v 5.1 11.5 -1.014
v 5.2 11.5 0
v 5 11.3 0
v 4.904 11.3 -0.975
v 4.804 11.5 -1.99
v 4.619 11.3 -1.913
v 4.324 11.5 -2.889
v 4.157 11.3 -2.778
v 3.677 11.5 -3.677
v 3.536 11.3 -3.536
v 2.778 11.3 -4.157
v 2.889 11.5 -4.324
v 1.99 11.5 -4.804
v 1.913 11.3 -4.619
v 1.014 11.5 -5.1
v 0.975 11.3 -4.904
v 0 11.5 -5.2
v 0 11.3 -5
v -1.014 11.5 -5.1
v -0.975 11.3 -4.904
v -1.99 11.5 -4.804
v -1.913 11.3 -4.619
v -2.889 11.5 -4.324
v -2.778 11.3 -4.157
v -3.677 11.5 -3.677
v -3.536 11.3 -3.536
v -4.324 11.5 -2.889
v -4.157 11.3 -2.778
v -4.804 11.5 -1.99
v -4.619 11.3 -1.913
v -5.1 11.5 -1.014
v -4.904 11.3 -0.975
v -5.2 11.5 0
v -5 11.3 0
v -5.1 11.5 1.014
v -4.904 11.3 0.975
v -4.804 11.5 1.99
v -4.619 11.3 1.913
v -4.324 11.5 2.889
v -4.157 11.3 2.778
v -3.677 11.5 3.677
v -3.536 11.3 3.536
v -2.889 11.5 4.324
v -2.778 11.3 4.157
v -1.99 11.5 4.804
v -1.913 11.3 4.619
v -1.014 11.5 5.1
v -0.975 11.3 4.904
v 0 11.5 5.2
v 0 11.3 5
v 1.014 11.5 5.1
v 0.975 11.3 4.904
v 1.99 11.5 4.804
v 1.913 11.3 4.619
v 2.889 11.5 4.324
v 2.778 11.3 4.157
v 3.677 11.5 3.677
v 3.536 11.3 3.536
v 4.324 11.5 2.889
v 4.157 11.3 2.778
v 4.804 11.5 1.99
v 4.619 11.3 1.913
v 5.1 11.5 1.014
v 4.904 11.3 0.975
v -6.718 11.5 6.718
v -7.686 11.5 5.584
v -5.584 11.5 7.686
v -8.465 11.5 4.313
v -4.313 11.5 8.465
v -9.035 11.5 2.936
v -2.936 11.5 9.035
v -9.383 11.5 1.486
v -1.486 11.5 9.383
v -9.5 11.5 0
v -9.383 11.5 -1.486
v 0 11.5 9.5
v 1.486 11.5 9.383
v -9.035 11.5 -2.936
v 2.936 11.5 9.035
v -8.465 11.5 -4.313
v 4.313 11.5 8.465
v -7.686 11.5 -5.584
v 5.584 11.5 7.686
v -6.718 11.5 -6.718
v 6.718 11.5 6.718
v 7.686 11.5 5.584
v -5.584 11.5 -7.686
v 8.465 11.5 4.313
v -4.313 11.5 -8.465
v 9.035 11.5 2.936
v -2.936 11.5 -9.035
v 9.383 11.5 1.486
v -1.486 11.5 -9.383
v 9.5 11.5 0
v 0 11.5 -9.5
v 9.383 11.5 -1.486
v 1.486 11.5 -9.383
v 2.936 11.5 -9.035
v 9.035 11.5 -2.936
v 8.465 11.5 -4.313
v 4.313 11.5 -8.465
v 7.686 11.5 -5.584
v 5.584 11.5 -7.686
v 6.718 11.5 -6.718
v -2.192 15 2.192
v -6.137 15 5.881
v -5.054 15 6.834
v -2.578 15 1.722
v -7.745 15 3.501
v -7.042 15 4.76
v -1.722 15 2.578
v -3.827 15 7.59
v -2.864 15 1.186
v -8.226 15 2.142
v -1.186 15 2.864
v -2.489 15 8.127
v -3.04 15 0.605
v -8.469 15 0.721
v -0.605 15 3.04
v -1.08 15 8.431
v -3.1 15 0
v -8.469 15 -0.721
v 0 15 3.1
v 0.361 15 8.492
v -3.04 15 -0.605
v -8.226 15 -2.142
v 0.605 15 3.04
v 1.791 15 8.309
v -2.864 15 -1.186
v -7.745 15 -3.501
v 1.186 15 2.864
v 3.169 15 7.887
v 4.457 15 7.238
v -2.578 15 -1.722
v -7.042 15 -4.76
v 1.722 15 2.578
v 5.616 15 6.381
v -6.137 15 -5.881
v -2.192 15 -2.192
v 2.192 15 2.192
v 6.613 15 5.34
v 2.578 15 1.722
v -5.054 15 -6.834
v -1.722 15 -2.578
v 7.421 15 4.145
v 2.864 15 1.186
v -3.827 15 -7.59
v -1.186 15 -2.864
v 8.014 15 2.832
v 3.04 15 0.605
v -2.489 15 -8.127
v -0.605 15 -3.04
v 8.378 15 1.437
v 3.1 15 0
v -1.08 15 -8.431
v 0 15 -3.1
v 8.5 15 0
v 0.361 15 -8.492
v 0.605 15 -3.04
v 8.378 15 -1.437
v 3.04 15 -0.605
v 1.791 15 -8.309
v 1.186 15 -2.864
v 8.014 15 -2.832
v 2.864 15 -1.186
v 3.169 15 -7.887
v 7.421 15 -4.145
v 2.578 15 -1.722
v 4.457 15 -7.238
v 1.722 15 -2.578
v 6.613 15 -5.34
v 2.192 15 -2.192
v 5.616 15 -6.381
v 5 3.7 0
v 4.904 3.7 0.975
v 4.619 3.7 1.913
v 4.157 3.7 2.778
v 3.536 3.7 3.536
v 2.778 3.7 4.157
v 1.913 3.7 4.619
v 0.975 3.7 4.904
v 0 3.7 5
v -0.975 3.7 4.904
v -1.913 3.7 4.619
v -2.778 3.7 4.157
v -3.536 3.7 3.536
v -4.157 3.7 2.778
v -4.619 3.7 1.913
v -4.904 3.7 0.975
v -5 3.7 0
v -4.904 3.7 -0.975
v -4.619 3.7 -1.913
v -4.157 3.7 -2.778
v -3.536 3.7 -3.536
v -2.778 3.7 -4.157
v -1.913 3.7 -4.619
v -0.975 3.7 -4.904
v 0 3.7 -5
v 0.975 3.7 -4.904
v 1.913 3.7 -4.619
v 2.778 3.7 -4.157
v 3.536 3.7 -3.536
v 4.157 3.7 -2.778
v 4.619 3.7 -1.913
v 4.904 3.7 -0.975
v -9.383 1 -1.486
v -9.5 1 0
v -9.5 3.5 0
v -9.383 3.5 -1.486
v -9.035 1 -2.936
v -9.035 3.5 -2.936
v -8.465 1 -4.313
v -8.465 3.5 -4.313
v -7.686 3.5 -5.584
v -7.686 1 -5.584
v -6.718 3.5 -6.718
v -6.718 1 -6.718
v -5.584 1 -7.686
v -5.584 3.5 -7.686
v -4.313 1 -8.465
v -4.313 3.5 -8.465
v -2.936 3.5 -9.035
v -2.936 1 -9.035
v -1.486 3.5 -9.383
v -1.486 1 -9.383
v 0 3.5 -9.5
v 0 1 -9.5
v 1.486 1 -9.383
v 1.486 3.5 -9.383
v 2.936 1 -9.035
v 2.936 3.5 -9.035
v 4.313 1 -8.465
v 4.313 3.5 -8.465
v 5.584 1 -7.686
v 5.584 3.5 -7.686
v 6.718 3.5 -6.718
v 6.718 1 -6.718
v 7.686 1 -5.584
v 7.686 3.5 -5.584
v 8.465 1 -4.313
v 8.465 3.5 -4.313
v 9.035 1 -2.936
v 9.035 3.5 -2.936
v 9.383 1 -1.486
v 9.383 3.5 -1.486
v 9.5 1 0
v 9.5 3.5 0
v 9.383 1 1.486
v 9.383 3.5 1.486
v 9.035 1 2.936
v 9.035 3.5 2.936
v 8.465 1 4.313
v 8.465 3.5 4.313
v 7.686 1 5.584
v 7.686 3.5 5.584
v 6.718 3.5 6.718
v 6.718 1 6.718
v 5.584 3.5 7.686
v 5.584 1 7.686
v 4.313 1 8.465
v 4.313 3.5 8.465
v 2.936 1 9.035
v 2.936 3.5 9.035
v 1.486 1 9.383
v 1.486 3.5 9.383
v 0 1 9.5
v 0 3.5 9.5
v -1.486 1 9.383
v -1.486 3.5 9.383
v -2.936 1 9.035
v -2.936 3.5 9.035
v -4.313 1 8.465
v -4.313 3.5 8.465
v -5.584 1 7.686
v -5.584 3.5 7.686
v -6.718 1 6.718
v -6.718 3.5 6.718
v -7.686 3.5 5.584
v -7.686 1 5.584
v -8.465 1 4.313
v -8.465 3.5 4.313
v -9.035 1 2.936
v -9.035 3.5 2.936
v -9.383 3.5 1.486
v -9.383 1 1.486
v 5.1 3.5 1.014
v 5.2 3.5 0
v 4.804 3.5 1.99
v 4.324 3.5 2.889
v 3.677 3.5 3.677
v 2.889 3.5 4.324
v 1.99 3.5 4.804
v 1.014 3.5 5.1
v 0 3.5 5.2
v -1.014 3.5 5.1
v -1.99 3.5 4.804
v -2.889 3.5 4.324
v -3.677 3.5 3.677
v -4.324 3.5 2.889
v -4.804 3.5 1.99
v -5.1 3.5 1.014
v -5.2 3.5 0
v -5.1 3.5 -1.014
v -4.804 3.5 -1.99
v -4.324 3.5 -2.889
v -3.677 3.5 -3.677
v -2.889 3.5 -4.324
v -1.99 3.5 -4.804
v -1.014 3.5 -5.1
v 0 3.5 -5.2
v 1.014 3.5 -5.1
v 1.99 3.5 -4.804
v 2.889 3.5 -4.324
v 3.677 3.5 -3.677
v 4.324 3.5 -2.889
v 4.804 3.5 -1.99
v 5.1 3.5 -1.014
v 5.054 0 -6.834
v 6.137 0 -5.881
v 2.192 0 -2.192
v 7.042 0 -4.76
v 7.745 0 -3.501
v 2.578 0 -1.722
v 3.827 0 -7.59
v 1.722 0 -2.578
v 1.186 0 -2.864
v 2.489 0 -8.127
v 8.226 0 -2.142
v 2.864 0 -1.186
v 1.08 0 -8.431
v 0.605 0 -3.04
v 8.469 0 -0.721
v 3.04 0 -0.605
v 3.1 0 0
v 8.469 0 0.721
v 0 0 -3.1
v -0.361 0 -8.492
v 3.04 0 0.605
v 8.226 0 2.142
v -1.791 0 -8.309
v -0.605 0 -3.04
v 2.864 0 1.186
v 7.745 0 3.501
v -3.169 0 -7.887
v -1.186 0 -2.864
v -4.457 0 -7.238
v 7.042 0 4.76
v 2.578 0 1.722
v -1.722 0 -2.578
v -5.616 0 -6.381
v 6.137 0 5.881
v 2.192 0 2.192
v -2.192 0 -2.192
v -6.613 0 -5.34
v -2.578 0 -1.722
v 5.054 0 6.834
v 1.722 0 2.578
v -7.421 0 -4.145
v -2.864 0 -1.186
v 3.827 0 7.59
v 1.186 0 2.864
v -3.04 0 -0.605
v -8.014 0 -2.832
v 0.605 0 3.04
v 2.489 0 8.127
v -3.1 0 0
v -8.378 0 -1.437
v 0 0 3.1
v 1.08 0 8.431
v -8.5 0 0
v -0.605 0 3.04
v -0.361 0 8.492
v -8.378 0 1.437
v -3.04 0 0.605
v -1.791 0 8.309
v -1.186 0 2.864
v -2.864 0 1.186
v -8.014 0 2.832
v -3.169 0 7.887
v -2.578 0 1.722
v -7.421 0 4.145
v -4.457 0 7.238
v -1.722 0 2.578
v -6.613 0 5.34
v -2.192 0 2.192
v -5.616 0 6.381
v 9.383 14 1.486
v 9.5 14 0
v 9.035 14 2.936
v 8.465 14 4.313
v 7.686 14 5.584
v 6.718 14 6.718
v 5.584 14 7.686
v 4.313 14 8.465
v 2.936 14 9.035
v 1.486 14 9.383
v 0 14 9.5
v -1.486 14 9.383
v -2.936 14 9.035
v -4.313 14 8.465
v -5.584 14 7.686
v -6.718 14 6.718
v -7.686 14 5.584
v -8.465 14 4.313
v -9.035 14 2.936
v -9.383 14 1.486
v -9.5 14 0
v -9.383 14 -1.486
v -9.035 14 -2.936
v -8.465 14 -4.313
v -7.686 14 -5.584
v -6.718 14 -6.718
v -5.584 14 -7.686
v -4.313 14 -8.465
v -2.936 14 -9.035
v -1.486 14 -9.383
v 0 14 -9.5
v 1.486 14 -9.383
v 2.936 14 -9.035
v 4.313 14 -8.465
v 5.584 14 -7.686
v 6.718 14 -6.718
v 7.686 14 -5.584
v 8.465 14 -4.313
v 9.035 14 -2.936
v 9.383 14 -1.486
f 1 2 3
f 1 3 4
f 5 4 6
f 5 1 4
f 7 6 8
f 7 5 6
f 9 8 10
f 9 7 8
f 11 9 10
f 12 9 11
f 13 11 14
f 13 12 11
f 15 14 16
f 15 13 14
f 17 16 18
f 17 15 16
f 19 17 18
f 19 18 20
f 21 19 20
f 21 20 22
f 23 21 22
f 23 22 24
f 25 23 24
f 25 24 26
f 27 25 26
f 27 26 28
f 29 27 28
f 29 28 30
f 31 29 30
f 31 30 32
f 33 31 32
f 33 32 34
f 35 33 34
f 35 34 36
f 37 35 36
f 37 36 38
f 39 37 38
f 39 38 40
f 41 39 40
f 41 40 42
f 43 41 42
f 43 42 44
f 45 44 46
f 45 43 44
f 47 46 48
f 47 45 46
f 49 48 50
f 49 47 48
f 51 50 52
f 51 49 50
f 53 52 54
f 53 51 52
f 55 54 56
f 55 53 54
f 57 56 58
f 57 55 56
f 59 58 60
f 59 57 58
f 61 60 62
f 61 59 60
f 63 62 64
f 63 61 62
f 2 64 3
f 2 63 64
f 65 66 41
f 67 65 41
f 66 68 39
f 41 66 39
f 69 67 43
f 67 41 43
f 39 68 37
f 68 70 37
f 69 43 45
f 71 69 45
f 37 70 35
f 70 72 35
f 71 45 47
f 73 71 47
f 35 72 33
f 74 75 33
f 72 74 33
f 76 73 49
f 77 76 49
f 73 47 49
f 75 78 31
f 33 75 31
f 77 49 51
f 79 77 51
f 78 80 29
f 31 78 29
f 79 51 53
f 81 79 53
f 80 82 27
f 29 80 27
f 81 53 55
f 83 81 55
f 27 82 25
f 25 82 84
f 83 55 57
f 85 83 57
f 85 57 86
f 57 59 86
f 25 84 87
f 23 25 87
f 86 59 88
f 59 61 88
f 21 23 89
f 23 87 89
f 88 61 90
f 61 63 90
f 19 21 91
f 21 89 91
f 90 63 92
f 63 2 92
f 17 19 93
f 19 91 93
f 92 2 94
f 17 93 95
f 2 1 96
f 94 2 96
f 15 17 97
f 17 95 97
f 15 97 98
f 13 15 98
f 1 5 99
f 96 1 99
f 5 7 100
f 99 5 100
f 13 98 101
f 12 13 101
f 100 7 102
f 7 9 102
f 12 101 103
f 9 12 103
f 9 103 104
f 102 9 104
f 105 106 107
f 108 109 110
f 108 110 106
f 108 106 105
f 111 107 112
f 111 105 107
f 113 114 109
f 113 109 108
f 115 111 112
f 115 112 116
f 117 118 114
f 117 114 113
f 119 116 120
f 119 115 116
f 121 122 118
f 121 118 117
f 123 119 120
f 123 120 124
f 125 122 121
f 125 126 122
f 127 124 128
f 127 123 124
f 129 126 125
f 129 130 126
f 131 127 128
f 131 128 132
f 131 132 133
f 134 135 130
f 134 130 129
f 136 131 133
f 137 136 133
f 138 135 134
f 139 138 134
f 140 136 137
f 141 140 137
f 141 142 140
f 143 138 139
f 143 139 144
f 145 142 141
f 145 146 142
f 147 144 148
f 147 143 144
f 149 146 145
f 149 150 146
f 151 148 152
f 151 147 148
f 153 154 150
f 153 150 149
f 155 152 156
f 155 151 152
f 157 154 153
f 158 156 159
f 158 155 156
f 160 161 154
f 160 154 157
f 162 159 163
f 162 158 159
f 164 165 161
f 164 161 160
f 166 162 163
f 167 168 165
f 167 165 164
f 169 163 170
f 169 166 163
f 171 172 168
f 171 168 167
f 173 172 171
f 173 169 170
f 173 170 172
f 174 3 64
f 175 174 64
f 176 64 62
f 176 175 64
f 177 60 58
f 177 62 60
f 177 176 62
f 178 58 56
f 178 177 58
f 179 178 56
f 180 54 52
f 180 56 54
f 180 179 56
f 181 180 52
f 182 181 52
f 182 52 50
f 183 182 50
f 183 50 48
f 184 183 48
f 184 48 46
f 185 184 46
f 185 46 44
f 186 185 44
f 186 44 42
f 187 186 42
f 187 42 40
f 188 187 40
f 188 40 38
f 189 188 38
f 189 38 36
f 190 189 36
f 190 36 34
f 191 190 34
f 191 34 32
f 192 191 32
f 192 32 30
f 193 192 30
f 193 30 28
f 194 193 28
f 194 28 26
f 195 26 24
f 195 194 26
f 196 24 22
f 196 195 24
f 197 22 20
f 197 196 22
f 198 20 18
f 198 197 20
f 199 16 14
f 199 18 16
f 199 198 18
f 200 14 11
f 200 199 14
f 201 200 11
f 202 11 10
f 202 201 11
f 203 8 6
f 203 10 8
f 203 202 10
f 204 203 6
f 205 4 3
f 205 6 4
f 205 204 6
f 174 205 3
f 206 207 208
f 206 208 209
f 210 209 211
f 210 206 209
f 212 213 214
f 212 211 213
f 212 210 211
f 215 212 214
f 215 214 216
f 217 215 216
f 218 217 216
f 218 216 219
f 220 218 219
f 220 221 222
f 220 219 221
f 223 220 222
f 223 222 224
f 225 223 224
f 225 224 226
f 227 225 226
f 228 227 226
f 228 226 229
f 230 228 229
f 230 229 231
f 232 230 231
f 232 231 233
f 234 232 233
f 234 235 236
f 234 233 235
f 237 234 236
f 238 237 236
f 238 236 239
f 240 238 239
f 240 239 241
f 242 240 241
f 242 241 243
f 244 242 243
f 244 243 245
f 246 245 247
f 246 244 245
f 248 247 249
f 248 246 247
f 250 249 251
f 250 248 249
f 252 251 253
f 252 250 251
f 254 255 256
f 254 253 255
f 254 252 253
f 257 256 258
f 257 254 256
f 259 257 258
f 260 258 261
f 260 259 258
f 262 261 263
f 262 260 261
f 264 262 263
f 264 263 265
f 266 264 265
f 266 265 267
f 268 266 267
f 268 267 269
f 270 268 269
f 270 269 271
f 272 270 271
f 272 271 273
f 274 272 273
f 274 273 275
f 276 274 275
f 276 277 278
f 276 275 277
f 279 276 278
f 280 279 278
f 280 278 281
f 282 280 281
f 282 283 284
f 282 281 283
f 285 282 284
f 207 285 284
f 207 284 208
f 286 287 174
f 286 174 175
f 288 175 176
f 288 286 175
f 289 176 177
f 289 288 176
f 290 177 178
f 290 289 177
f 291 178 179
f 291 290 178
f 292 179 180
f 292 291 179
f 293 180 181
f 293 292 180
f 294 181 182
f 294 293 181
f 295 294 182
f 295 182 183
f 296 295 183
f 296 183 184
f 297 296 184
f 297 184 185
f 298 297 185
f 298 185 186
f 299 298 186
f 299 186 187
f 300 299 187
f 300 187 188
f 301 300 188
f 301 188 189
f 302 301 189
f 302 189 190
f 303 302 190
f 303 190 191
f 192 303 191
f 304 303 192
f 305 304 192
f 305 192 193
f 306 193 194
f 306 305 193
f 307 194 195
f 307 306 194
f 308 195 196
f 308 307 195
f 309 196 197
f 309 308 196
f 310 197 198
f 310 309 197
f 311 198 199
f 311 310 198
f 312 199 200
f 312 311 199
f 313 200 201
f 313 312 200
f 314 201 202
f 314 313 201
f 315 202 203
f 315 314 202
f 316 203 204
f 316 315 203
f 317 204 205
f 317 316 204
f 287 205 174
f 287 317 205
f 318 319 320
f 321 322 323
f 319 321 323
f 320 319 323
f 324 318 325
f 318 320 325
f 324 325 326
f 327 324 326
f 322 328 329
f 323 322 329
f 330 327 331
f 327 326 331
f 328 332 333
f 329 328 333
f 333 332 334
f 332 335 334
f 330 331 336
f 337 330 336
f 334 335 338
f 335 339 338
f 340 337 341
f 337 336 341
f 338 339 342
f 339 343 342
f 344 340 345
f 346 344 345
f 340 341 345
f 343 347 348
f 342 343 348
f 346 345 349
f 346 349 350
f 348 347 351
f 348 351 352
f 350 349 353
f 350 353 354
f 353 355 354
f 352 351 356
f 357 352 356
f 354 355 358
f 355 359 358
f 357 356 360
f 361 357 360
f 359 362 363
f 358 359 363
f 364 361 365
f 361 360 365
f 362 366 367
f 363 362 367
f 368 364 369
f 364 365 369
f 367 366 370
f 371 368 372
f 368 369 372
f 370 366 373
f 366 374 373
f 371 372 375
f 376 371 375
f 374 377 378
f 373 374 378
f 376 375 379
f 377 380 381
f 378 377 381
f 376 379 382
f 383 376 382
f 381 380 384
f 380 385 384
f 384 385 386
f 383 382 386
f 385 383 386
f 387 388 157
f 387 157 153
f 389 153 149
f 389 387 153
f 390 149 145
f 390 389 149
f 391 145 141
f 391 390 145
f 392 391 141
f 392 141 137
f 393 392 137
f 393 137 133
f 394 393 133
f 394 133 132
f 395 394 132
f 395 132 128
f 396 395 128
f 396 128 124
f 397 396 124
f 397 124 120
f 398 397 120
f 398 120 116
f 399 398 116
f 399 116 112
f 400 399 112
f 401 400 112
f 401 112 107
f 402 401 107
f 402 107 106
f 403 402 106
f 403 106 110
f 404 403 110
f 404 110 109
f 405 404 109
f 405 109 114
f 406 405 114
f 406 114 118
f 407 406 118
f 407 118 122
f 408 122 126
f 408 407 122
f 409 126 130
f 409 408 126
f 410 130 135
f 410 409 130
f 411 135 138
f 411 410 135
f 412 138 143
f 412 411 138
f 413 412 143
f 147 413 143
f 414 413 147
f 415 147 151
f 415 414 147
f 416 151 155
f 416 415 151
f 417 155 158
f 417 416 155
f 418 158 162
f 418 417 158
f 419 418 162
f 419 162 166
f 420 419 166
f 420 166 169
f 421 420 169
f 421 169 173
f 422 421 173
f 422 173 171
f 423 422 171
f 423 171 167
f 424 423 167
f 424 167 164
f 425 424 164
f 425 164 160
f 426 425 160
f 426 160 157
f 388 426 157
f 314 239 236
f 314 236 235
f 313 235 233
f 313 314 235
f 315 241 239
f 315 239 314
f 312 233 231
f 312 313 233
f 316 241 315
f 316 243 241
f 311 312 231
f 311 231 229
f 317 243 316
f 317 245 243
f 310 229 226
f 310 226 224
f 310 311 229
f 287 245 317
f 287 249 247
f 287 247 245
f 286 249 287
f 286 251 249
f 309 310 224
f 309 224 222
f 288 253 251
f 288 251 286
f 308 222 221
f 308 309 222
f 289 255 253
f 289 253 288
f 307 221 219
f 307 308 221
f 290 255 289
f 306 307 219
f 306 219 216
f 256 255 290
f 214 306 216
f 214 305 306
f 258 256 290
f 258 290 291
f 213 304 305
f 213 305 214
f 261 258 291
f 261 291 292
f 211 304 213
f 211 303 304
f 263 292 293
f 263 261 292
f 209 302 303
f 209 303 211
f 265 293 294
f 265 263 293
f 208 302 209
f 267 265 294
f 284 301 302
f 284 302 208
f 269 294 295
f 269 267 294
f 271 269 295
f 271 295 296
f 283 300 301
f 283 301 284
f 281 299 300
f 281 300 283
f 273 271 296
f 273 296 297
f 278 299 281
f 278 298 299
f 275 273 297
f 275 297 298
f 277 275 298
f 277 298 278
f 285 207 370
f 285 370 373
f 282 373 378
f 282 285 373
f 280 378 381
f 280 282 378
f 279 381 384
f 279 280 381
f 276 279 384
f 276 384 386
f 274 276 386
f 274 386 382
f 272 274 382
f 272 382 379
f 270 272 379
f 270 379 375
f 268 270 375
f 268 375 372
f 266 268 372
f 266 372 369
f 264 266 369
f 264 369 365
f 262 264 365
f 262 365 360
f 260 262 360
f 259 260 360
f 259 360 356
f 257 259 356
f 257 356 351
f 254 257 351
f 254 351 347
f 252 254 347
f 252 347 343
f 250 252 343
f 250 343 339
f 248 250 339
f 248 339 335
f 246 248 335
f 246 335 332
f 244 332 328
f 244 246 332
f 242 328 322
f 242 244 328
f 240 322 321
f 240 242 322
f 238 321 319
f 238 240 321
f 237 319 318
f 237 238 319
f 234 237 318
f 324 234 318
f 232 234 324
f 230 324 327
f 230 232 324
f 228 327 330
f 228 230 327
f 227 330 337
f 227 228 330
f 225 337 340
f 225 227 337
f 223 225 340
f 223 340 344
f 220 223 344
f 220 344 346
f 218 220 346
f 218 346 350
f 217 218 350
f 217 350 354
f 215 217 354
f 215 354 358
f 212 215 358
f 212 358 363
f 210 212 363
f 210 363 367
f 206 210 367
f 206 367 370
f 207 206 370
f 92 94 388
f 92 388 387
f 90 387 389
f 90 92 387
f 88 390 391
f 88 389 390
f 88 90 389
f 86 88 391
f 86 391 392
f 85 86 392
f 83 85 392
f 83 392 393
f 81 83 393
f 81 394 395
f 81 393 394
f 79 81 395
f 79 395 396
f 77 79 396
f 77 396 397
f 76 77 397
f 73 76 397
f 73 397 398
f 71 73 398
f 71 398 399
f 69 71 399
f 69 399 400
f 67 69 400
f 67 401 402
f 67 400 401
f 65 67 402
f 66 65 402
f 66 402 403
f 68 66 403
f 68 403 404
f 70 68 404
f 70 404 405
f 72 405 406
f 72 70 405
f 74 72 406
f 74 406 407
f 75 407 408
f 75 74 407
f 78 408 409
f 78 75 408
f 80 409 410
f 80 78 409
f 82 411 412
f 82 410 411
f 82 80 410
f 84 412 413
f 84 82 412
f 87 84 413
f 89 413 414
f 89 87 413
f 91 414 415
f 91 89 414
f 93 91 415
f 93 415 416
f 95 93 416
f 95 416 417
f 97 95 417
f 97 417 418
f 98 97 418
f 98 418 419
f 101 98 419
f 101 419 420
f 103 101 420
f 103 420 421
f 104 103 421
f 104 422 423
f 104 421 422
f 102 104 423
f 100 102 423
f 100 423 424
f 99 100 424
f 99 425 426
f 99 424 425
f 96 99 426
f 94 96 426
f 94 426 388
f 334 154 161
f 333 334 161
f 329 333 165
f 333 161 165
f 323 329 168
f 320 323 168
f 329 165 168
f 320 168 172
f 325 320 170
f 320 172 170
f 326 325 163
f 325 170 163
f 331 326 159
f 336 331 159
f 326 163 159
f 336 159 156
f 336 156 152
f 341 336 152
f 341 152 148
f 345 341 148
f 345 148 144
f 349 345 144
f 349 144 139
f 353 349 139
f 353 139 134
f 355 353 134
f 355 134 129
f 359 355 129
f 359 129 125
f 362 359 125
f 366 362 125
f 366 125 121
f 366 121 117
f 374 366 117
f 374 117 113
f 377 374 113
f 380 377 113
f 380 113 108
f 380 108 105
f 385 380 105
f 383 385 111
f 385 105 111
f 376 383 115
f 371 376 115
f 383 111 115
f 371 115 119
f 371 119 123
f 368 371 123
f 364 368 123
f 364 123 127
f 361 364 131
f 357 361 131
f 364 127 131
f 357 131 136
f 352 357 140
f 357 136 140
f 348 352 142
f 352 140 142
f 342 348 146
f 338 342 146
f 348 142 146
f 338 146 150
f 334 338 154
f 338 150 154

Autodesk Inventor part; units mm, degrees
ref_plane "YZ Plane" through (0, 0, 0) normal (1, 0, 0) x (0, 1, 0)
ref_plane "XZ Plane" through (0, 0, 0) normal (0, 1, 0) x (-1, 0, 0)
ref_plane "XY Plane" through (0, 0, 0) normal (0, 0, 1) x (1, 0, 0)
sketch "Эскиз1" plane through (0, 0, 0) normal (0, 1, 0) x (-1, 0, 0)
  circle A0 centre (0, 0) radius 9.5
  dimension "d0" = 19
extrude "Выдавливание1" add sketch "Эскиз1" along normal blind 3.5
sketch "Эскиз2" plane through (0, 3.5, 0) normal (0, 1, 0) x (1, 0, 0)
  circle A0 centre (0, 0) radius 5
  dimension "d3" = 10
extrude "Выдавливание2" add sketch "Эскиз2" along normal blind 8
sketch "Эскиз3" plane through (0, 11.5, 0) normal (0, 1, 0) x (1, 0, 0)
  circle A0 centre (0, 0) radius 9.5
extrude "Выдавливание3" add sketch "Эскиз3" along normal blind 3.5
chamfer "Фаска1" distance 1 angle 45 2 edges at (9.5, 0, 0) (-9.5, 15, 0)
chamfer "Фаска2" distance 0.2 angle 45 2 edges at (-5, 11.5, 0) (-5, 3.5, 0)
sketch "Эскиз4" plane through (0, 15, 0) normal (0, 1, 0) x (1, 0, 0)
  circle A0 centre (0, 0) radius 3.1
  dimension "d14" = 6.2
extrude "Выдавливание4" cut sketch "Эскиз4" against normal through all
properties part number "КВ33.044.402 - Каток" material "ПВХ, непластифицированный"
